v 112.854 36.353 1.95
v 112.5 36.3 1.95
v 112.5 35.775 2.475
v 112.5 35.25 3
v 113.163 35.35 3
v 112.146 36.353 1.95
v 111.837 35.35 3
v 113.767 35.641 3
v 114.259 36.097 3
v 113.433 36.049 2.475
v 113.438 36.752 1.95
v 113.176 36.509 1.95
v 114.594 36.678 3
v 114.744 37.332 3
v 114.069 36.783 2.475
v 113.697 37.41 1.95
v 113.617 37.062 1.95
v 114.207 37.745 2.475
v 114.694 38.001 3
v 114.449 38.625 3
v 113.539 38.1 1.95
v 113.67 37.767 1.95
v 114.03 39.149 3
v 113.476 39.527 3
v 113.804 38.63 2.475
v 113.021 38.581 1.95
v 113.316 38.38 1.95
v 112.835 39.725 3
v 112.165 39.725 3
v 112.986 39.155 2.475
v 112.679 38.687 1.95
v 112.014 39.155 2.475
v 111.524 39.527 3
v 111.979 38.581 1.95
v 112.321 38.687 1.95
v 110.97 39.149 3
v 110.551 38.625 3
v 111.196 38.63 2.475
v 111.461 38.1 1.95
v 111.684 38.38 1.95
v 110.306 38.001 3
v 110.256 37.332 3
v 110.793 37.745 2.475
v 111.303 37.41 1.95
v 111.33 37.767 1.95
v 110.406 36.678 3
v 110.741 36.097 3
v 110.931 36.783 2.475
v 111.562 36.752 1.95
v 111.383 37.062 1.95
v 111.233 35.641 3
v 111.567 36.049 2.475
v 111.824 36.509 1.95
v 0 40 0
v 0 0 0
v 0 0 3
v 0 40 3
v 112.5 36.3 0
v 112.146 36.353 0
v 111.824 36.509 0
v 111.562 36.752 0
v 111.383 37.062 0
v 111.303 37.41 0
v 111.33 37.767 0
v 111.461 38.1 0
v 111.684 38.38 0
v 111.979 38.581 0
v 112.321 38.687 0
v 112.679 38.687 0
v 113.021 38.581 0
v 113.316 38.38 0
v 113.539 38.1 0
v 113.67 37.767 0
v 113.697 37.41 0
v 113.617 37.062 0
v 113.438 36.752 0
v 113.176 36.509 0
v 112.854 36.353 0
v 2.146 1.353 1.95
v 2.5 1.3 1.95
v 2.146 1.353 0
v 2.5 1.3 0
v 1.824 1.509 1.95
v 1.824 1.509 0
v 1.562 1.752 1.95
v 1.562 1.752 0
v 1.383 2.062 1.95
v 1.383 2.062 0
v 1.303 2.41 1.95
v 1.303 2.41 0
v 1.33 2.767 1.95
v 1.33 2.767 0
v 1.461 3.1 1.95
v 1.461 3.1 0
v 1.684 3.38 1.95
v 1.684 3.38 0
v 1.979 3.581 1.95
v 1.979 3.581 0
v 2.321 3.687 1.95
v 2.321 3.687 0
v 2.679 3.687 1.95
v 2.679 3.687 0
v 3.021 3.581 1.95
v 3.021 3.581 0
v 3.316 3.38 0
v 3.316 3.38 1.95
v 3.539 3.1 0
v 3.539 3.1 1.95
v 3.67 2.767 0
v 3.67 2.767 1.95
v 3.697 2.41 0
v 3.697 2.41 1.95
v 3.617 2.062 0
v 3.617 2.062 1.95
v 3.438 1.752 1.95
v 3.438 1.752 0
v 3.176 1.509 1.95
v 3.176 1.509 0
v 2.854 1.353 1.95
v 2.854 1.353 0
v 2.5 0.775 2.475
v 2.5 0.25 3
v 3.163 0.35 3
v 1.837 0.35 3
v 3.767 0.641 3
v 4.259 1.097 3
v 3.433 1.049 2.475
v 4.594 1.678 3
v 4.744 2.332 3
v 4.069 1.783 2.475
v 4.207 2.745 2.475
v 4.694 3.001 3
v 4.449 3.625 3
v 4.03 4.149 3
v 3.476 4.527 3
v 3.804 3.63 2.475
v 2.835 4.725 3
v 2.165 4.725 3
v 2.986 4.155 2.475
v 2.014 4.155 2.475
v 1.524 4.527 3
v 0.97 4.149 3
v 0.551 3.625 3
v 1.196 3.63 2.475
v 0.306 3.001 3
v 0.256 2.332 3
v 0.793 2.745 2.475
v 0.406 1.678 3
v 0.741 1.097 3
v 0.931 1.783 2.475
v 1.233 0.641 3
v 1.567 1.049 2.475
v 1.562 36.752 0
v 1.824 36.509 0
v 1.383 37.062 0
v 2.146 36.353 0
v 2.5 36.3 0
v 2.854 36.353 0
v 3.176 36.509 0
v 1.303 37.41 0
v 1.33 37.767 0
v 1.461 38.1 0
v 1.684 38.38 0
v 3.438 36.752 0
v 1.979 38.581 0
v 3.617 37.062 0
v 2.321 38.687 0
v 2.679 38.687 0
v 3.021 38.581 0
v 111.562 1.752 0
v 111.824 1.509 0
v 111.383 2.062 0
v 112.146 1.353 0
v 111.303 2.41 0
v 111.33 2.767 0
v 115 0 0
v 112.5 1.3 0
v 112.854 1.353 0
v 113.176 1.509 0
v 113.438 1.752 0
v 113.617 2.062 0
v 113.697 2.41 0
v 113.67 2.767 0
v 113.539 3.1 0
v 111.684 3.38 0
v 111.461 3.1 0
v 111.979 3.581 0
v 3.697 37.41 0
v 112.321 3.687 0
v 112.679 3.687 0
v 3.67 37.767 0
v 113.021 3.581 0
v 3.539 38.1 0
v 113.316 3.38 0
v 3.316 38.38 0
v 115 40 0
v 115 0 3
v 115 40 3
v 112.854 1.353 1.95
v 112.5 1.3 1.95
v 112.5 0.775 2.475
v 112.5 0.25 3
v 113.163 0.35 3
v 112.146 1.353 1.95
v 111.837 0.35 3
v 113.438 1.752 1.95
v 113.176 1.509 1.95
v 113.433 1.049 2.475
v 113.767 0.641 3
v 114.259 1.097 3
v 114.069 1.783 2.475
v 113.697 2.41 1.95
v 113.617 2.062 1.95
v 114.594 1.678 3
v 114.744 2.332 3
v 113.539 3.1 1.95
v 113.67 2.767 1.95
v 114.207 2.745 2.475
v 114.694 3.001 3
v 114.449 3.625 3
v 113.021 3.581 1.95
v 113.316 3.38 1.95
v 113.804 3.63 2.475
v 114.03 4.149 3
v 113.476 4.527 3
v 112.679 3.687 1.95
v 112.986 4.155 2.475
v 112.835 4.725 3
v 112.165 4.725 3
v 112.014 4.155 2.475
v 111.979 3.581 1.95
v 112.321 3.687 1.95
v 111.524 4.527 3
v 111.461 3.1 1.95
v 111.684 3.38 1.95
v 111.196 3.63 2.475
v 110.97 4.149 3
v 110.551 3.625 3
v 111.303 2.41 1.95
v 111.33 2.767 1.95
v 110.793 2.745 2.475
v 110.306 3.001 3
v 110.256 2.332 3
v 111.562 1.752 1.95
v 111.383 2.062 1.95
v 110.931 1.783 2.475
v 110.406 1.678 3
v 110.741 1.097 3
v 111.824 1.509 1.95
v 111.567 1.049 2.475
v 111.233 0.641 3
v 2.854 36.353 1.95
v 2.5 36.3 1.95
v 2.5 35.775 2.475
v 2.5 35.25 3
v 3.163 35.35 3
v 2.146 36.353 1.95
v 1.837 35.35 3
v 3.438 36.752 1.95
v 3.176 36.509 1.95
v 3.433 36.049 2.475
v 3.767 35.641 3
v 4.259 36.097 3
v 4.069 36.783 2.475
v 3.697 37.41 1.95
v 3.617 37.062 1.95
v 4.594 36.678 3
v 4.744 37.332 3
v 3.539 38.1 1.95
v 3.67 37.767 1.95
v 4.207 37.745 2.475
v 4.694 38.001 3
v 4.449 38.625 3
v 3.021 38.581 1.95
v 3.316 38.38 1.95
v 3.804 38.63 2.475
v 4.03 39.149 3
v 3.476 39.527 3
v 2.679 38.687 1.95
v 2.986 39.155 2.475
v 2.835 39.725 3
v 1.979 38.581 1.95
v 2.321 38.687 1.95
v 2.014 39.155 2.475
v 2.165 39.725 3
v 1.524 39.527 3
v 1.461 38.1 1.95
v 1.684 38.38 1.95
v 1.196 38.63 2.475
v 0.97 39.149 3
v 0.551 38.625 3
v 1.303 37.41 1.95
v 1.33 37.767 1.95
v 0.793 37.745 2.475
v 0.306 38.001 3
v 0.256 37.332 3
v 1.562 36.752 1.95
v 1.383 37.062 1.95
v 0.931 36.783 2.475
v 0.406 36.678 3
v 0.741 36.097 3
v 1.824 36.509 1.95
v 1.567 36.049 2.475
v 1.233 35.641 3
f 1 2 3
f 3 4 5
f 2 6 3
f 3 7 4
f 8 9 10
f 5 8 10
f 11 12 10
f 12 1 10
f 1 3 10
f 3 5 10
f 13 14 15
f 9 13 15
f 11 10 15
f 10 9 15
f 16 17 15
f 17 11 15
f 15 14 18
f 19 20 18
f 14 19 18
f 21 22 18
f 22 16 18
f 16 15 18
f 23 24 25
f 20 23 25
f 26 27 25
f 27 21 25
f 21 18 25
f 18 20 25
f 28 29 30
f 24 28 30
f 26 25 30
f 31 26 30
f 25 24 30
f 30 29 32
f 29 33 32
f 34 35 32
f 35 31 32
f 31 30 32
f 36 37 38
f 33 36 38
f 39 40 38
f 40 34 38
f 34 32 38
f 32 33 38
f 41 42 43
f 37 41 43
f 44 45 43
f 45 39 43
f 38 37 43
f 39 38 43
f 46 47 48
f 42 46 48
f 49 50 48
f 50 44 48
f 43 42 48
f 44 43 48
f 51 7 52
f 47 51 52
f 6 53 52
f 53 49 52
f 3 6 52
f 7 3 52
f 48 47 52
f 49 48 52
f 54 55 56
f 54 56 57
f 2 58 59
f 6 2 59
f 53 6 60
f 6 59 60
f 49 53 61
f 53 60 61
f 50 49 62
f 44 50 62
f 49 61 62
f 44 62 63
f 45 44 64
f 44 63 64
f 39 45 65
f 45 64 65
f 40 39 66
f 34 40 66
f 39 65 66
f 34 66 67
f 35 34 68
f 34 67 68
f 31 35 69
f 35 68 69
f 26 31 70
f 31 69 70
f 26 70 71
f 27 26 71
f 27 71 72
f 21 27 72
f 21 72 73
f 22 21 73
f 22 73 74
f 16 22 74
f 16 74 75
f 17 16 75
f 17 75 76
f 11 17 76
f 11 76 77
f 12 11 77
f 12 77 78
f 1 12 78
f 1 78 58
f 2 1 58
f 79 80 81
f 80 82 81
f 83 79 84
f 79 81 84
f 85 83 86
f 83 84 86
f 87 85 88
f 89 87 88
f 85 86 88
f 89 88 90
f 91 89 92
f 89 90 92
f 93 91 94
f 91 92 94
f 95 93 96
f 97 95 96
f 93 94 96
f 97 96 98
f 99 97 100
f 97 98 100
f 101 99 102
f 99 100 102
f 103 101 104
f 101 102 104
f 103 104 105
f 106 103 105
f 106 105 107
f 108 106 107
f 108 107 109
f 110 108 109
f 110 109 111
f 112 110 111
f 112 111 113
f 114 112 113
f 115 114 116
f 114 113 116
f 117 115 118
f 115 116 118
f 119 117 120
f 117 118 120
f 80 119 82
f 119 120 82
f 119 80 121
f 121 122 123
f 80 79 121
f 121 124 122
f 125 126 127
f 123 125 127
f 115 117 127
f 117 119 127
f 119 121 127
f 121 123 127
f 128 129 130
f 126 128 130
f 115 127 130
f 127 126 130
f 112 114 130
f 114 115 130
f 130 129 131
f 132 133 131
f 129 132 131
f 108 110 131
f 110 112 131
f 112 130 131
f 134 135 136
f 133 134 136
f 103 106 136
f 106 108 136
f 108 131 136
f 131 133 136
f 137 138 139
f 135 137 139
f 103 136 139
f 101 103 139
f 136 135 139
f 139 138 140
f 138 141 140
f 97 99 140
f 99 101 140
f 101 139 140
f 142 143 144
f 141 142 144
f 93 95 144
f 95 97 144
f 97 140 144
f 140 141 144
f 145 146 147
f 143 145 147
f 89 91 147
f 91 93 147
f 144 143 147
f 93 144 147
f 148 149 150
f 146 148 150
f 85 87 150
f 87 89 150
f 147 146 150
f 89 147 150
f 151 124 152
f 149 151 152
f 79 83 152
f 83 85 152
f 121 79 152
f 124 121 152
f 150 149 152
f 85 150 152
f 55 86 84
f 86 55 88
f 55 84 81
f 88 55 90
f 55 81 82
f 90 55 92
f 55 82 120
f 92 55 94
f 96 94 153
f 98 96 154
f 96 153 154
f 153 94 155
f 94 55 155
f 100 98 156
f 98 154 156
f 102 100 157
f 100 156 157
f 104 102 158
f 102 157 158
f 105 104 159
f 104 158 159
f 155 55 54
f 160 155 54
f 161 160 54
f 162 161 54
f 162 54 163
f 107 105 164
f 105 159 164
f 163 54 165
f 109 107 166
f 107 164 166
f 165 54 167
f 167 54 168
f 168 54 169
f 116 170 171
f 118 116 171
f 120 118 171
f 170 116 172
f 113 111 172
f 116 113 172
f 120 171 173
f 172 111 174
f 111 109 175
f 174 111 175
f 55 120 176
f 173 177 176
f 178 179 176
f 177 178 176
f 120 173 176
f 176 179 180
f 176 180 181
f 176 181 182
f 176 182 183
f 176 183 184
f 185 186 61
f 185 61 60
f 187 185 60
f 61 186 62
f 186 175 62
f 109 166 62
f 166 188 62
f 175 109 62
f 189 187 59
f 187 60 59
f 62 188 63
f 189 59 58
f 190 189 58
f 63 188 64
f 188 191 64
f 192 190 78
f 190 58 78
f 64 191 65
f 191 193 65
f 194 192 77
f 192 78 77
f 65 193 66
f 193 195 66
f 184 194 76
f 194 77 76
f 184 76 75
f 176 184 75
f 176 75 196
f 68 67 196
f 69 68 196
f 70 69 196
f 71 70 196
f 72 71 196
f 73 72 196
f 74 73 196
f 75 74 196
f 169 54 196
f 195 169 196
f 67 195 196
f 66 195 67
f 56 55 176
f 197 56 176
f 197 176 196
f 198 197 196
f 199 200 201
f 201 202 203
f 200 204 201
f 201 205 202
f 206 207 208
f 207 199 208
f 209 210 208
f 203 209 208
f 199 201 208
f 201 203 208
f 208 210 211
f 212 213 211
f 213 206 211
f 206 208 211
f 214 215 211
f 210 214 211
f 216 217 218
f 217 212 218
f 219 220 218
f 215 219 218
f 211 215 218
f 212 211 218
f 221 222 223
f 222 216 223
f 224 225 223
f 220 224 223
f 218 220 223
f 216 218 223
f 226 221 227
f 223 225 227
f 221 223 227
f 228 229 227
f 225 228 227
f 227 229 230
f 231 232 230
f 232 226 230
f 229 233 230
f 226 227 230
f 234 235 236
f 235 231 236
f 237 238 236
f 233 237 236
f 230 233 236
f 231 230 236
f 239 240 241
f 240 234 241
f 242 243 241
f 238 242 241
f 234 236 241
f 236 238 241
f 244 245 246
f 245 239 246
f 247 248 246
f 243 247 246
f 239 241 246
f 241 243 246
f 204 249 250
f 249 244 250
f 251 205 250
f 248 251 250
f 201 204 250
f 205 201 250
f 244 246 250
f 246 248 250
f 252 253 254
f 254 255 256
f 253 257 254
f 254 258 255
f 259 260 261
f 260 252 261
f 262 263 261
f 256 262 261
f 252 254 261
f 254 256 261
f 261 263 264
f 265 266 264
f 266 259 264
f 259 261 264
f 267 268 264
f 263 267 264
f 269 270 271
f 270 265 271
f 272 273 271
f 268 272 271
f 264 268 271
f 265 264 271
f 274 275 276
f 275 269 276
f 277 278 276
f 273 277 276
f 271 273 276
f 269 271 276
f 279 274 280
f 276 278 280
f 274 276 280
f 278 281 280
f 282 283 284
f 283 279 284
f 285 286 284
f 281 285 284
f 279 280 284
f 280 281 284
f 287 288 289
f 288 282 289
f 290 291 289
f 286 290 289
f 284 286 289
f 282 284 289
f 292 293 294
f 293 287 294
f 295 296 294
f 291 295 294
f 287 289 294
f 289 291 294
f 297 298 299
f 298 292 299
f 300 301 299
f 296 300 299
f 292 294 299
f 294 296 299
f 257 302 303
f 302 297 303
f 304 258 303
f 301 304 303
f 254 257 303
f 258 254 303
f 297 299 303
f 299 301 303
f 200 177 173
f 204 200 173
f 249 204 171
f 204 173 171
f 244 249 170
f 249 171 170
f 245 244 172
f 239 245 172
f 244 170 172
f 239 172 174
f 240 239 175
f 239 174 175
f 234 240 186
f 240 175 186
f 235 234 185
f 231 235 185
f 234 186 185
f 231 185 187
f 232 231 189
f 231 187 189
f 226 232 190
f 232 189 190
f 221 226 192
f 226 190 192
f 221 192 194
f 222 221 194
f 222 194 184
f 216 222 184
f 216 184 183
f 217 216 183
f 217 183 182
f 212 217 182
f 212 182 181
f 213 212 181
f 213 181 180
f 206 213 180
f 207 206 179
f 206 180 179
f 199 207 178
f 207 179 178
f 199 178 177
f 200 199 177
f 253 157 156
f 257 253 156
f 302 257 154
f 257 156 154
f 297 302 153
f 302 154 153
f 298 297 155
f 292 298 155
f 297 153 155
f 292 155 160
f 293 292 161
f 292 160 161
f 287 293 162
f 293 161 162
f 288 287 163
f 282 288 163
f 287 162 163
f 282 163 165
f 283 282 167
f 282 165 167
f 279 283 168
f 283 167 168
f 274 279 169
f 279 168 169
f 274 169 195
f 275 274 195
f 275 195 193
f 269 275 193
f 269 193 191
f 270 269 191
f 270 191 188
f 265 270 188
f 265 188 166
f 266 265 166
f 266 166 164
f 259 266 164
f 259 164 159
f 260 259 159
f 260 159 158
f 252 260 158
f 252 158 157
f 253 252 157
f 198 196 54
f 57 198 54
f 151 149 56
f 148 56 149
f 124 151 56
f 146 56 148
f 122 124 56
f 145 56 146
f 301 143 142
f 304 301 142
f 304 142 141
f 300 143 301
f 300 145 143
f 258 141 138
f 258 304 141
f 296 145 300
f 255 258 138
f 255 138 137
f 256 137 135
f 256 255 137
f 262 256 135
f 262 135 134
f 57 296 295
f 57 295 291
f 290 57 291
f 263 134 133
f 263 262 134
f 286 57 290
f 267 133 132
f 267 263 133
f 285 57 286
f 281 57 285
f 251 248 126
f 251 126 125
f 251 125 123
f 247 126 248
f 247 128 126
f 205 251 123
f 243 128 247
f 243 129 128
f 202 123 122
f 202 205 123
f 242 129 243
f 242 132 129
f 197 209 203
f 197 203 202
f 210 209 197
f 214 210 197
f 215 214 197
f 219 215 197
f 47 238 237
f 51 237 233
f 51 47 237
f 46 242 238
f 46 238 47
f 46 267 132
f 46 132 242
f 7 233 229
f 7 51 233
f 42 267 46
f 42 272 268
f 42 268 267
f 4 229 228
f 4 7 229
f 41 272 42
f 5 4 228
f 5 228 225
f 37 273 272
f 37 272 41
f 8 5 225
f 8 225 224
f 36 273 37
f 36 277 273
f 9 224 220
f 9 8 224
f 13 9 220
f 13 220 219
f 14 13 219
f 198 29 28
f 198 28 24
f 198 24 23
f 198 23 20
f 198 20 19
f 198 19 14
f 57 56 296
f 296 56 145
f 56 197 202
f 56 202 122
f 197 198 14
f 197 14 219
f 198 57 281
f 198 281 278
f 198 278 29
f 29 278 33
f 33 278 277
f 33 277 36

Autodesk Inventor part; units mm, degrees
ref_plane "YZ Plane" through (0, 0, 0) normal (1, 0, 0) x (0, 1, 0)
ref_plane "XZ Plane" through (0, 0, 0) normal (0, 1, 0) x (-1, 0, 0)
ref_plane "XY Plane" through (0, 0, 0) normal (0, 0, 1) x (1, 0, 0)
sketch "Skizze1" plane through (0, 0, 0) normal (0, 0, 1) x (1, 0, 0)
  line L0 (-23, 0) -> (138, 0) projected
  line L1 (0, -8) -> (0, 48) projected
  line L2 (0, 0) -> (115, 0)
  line L3 (115, 0) -> (115, 40)
  line L4 (115, 40) -> (0, 40)
  line L5 (0, 40) -> (0, 0)
  dimension "d0" = 40
  dimension "d1" = 115
extrude "Extrusion1" add sketch "Skizze1" along normal blind 3
sketch "Skizze2" plane through (0, 0, 3) normal (0, 0, 1) x (1, 0, 0)
  line L0 (0, 0) -> (115, 0) projected
  line L1 (115, 0) -> (115, 40) projected
  line L2 (115, 40) -> (0, 40) projected
  line L3 (0, 40) -> (0, 0) projected
  line L4 (2.5, 37.5) -> (112.5, 37.5)
  line L5 (112.5, 37.5) -> (112.5, 2.5)
  line L6 (112.5, 2.5) -> (2.5, 2.5)
  line L7 (2.5, 2.5) -> (2.5, 37.5)
  dimension "d5" = 2.5
hole "Bohrung1" at (2.5, 37.5, 3) at (2.5, 2.5, 3) at (112.5, 2.5, 3) at (112.5, 37.5, 3) direction (0, 0, -1) diameter 2.4 end through all countersink diameter 4.5 countersink angle 90
properties part number "13_1087_024"
